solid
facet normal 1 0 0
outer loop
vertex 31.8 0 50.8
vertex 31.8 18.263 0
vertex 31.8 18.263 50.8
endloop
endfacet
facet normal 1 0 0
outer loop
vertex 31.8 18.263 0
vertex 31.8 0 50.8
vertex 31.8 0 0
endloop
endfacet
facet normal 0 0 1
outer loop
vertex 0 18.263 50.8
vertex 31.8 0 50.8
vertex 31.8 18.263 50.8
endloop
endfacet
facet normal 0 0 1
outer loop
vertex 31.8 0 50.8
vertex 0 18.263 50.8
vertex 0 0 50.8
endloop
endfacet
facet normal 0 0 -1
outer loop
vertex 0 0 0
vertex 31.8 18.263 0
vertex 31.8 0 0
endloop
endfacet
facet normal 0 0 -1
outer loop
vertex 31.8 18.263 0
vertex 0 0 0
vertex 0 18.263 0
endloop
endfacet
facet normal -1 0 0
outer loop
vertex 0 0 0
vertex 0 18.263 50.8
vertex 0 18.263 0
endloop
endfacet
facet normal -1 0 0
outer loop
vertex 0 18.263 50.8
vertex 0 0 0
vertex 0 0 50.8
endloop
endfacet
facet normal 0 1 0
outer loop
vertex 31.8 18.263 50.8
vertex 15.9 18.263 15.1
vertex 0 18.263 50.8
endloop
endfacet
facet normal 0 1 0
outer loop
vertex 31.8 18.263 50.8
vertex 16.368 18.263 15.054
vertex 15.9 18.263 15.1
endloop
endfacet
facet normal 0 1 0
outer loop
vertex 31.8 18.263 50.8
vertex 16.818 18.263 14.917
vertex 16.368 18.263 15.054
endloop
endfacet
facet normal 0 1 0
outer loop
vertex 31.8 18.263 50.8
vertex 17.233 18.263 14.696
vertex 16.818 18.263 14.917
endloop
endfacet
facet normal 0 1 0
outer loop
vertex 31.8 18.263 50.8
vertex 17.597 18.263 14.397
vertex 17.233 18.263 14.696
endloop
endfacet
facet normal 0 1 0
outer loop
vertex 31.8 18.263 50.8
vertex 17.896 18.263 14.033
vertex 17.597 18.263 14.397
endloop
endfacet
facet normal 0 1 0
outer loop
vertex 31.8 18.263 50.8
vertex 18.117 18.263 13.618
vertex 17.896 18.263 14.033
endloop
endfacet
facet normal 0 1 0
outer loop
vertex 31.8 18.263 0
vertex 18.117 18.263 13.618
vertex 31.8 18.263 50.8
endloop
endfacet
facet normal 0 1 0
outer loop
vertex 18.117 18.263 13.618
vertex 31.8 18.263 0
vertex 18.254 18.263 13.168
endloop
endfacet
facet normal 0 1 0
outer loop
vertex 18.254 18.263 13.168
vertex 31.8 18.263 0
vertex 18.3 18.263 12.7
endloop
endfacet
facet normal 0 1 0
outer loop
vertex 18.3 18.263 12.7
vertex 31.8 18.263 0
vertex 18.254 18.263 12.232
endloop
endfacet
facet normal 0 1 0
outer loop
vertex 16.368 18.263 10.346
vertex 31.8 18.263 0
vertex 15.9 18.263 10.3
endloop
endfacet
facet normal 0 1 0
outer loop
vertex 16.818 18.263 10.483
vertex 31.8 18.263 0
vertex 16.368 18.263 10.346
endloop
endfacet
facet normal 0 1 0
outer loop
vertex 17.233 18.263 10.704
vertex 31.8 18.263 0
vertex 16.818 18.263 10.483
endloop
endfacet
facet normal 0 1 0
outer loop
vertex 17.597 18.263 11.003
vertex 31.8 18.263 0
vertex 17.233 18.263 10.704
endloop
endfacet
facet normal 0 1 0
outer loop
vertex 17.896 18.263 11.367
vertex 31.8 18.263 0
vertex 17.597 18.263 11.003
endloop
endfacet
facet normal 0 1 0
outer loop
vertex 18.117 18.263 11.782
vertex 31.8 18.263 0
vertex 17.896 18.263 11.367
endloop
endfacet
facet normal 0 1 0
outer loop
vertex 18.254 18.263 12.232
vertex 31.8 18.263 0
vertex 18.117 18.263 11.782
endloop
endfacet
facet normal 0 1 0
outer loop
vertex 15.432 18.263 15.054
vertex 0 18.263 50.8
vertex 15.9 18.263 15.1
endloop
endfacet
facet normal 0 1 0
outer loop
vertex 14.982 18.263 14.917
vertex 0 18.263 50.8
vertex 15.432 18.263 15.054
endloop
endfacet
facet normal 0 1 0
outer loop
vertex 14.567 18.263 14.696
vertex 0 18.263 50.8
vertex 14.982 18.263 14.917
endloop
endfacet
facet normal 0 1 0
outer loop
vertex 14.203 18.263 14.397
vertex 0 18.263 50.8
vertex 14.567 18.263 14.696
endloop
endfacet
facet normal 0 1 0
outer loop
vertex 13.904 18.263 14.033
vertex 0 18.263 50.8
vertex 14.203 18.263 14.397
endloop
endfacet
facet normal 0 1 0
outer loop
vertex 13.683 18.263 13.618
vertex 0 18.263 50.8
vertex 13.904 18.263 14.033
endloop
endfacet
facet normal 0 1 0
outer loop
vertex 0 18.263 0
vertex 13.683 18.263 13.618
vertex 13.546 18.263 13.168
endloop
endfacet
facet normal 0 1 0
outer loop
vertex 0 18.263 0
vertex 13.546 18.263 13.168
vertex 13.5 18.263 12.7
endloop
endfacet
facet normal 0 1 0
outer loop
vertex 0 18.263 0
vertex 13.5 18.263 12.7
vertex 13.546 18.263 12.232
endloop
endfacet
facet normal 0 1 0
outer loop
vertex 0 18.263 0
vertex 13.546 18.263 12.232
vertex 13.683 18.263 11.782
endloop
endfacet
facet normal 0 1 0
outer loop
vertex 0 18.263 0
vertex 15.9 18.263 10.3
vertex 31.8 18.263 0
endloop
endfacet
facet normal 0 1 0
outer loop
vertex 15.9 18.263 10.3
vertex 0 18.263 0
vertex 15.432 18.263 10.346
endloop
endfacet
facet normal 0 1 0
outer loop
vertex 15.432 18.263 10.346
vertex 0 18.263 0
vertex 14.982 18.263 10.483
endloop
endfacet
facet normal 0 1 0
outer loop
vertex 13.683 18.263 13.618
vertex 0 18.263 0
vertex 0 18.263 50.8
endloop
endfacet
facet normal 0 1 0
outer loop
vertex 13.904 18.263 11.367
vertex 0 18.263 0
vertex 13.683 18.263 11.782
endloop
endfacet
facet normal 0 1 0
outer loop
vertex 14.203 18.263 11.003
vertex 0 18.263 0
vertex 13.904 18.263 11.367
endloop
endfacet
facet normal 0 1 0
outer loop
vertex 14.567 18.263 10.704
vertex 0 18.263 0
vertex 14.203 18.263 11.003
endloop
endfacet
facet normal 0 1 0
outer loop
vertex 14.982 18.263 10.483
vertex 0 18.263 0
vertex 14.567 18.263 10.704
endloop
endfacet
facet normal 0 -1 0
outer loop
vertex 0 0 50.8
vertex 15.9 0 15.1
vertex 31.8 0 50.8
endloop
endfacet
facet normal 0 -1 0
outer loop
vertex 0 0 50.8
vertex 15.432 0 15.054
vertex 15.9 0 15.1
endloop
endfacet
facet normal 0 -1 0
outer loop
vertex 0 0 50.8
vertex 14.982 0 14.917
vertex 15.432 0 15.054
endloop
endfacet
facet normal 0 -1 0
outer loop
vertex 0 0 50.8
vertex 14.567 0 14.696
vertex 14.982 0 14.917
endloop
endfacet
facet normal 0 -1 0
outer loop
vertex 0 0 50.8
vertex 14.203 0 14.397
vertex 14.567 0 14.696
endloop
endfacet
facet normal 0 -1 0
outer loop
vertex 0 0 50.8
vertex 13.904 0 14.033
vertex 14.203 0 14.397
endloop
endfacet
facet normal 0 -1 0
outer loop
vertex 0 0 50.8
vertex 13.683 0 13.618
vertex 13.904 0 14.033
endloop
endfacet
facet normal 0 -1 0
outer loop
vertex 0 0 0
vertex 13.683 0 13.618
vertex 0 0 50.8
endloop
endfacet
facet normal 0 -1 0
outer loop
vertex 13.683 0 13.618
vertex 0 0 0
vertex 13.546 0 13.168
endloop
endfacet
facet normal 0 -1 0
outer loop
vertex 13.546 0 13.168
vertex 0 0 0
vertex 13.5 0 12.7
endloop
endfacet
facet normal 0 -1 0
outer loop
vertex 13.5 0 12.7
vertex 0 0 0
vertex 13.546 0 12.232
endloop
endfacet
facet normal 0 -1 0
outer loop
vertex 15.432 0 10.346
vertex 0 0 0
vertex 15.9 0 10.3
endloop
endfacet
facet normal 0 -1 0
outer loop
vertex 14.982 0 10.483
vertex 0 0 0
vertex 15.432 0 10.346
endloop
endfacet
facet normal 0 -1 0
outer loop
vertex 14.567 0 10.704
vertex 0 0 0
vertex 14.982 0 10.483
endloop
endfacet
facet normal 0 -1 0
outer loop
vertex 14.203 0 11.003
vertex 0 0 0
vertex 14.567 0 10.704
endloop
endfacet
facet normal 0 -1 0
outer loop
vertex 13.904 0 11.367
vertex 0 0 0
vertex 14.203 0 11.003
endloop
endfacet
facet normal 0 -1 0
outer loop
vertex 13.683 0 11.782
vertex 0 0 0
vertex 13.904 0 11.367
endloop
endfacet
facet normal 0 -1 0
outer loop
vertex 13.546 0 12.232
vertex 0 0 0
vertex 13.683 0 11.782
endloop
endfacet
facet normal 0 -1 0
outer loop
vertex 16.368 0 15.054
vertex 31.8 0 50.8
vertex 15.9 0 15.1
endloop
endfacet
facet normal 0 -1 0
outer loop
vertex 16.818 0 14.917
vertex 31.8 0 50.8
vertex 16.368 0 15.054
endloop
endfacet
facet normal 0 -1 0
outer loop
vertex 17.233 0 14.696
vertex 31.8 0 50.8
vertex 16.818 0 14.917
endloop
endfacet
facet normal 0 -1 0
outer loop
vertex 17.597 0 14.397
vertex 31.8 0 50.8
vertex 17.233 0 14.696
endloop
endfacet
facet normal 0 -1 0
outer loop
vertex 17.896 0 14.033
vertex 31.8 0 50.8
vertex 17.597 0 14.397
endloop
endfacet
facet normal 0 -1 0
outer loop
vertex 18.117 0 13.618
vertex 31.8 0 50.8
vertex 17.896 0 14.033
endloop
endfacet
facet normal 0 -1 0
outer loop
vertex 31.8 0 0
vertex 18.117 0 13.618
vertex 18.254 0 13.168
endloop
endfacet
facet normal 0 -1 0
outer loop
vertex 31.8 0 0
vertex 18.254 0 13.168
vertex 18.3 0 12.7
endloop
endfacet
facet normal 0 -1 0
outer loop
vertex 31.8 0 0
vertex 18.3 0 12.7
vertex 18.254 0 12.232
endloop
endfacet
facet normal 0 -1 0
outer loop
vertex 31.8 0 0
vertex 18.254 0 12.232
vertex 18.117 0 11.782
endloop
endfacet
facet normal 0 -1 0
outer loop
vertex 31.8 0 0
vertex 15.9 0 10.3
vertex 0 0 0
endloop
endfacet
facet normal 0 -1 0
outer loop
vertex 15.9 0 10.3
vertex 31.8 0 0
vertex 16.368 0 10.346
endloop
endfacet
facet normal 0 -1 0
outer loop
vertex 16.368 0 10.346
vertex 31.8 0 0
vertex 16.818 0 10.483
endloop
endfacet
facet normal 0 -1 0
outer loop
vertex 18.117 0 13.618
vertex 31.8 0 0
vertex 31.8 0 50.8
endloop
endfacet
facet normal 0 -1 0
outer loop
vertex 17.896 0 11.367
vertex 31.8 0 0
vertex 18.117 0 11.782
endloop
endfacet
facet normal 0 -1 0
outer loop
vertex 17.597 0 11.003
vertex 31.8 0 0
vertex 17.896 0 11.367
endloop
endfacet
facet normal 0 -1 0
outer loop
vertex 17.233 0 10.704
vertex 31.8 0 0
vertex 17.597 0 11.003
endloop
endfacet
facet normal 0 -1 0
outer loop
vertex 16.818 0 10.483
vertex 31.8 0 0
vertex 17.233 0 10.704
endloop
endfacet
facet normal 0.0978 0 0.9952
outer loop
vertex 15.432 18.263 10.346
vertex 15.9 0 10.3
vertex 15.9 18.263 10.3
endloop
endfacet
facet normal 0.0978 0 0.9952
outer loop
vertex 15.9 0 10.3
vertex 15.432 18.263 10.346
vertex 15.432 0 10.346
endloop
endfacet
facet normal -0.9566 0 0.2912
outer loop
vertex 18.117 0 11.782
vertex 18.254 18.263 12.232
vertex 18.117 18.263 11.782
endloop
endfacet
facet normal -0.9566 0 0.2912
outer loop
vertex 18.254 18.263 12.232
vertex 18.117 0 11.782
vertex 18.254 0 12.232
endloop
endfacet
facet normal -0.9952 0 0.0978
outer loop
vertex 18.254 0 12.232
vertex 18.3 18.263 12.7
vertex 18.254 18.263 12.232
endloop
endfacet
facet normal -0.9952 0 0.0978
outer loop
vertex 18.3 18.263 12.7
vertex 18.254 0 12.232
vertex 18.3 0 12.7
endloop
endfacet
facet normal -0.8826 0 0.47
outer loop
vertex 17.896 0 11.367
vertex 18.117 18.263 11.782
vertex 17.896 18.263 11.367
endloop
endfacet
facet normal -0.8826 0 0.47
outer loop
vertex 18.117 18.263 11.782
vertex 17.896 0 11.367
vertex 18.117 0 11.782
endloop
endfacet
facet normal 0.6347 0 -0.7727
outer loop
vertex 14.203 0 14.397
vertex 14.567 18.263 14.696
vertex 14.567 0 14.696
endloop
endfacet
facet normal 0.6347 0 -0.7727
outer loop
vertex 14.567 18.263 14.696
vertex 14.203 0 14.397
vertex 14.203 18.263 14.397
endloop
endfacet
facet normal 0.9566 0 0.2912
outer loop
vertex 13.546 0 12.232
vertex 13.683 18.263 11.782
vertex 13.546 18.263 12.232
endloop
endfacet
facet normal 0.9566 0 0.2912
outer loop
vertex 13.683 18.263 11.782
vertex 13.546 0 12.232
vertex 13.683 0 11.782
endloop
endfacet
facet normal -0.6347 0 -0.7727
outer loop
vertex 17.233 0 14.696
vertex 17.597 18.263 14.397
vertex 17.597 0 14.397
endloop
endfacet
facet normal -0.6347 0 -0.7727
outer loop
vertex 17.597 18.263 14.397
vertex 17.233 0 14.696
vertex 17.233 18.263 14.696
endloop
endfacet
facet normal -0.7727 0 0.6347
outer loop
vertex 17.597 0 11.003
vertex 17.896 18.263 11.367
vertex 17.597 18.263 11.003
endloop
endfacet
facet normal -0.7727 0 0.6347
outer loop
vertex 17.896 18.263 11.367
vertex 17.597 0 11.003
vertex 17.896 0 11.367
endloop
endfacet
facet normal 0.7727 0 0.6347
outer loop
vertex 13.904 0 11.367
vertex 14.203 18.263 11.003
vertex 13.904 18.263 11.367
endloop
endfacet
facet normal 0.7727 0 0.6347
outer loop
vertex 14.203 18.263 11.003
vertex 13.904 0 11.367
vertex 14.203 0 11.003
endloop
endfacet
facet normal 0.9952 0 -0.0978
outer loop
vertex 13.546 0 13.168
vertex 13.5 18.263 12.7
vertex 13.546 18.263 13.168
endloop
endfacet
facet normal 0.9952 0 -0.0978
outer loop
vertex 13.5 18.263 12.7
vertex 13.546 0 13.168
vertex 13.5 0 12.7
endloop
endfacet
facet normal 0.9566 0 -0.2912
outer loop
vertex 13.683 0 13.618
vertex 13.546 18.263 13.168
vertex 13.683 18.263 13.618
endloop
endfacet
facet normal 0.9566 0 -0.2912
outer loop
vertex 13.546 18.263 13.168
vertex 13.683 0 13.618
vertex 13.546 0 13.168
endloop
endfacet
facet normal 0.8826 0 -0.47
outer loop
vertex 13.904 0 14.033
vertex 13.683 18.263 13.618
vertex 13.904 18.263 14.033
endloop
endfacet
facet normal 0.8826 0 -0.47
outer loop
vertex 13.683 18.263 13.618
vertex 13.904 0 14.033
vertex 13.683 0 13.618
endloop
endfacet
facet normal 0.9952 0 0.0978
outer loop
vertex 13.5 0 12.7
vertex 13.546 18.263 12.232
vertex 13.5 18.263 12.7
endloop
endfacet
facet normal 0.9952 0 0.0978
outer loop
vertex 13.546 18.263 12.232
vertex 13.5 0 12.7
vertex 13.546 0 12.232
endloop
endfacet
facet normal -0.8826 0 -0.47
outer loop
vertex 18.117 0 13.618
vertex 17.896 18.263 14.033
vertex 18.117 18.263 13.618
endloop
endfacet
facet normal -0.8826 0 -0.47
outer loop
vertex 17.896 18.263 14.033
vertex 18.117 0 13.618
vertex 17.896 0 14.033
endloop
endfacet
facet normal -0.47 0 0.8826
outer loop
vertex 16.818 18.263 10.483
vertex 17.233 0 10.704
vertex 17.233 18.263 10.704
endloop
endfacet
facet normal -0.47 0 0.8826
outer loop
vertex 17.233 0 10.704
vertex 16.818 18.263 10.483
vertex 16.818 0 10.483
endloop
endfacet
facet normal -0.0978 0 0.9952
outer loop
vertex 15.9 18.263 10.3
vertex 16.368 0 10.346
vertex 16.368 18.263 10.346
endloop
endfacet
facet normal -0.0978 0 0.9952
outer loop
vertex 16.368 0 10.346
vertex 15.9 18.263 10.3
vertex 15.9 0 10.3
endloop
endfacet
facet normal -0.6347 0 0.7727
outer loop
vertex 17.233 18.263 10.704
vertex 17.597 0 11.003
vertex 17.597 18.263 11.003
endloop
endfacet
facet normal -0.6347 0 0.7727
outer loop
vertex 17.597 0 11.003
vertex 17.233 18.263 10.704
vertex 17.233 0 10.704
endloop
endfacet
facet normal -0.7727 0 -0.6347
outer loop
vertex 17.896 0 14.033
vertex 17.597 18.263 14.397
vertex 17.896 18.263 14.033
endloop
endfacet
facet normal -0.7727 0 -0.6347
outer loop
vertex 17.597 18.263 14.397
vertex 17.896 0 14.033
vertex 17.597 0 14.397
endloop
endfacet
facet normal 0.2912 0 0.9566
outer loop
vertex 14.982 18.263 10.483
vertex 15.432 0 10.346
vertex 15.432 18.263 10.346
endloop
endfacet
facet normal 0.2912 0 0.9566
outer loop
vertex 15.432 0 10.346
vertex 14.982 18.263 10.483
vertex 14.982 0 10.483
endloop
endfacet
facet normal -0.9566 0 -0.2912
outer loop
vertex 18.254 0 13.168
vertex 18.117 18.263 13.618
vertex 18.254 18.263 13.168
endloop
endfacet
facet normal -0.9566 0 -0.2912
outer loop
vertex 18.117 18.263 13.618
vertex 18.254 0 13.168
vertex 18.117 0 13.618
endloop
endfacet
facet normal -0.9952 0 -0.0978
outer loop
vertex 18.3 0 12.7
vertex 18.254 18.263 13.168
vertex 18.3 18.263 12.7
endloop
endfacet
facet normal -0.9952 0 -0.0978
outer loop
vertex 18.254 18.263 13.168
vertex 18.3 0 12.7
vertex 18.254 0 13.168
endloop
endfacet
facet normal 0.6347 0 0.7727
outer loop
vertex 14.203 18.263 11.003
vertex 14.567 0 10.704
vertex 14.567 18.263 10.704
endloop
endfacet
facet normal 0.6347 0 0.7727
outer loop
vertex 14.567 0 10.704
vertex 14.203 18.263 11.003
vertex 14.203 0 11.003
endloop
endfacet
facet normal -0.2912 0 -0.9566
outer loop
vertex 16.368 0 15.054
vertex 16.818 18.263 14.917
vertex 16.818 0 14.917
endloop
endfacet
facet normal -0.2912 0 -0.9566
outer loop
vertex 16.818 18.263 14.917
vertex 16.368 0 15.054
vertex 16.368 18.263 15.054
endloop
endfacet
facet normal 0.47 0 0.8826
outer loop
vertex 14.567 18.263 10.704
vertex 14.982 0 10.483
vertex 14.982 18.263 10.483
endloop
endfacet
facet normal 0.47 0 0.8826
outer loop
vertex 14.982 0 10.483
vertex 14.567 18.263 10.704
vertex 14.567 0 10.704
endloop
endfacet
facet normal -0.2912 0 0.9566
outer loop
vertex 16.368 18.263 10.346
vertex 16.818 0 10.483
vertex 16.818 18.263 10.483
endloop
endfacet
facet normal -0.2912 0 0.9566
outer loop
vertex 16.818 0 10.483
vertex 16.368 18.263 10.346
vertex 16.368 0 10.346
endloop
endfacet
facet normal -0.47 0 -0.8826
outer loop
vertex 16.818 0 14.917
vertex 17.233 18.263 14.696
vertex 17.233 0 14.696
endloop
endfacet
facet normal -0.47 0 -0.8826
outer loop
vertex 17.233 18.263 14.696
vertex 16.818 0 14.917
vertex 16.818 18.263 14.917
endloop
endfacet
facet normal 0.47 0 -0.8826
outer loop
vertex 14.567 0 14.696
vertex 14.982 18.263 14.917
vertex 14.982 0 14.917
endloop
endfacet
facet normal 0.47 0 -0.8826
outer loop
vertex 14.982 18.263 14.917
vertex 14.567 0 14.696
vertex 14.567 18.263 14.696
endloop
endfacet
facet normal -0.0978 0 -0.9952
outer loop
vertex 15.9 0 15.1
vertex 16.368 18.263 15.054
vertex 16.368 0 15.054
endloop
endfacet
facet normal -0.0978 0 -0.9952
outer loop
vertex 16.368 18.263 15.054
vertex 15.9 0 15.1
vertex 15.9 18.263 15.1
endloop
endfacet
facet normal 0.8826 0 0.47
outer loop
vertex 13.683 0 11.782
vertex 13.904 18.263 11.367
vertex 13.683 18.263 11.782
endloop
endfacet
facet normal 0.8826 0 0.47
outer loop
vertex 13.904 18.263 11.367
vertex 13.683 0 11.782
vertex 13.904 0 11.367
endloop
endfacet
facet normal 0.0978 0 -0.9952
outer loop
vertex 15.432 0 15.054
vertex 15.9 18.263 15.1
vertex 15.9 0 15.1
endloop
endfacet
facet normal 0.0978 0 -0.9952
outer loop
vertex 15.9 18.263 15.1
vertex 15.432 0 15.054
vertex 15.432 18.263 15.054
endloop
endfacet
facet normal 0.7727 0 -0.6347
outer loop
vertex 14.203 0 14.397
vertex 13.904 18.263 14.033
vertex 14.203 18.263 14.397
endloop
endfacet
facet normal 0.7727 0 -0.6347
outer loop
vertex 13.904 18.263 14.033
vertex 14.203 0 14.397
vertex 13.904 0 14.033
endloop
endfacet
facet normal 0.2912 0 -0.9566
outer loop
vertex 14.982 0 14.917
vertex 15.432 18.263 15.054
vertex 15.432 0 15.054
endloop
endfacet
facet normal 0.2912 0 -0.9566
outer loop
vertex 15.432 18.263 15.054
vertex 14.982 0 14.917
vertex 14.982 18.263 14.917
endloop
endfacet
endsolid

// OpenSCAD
// Drill Guide Block
// Dimensions: 31.8mm x 50.8mm x 25mm

// ========== Parameters ==========

width = 31.8;    // X dimension
height = 50.8;   // Z dimension (tall)
// Thickness depends on gap between elevator horns
thickness = 18.2625;  // Y dimension (depth) — 23/32"

// Hole parameters
// #12 drill bit = 0.189" = 4.8mm
hole_diameter = 4.8;
hole_from_bottom = 12.7;  // Z position from bottom
hole_from_side = 15.9;    // X position from left side

// ========== Main Assembly ==========

module drill_guide_block() {
    difference() {
        // Main block
        cube([width, thickness, height]);

        // #12 hole through the thickness (Y axis)
        translate([hole_from_side, -0.01, hole_from_bottom])
            rotate([-90, 0, 0])
                cylinder(h = thickness + 0.02, d = hole_diameter, $fn = 32);
    }
}

// ========== Render ==========

drill_guide_block();
